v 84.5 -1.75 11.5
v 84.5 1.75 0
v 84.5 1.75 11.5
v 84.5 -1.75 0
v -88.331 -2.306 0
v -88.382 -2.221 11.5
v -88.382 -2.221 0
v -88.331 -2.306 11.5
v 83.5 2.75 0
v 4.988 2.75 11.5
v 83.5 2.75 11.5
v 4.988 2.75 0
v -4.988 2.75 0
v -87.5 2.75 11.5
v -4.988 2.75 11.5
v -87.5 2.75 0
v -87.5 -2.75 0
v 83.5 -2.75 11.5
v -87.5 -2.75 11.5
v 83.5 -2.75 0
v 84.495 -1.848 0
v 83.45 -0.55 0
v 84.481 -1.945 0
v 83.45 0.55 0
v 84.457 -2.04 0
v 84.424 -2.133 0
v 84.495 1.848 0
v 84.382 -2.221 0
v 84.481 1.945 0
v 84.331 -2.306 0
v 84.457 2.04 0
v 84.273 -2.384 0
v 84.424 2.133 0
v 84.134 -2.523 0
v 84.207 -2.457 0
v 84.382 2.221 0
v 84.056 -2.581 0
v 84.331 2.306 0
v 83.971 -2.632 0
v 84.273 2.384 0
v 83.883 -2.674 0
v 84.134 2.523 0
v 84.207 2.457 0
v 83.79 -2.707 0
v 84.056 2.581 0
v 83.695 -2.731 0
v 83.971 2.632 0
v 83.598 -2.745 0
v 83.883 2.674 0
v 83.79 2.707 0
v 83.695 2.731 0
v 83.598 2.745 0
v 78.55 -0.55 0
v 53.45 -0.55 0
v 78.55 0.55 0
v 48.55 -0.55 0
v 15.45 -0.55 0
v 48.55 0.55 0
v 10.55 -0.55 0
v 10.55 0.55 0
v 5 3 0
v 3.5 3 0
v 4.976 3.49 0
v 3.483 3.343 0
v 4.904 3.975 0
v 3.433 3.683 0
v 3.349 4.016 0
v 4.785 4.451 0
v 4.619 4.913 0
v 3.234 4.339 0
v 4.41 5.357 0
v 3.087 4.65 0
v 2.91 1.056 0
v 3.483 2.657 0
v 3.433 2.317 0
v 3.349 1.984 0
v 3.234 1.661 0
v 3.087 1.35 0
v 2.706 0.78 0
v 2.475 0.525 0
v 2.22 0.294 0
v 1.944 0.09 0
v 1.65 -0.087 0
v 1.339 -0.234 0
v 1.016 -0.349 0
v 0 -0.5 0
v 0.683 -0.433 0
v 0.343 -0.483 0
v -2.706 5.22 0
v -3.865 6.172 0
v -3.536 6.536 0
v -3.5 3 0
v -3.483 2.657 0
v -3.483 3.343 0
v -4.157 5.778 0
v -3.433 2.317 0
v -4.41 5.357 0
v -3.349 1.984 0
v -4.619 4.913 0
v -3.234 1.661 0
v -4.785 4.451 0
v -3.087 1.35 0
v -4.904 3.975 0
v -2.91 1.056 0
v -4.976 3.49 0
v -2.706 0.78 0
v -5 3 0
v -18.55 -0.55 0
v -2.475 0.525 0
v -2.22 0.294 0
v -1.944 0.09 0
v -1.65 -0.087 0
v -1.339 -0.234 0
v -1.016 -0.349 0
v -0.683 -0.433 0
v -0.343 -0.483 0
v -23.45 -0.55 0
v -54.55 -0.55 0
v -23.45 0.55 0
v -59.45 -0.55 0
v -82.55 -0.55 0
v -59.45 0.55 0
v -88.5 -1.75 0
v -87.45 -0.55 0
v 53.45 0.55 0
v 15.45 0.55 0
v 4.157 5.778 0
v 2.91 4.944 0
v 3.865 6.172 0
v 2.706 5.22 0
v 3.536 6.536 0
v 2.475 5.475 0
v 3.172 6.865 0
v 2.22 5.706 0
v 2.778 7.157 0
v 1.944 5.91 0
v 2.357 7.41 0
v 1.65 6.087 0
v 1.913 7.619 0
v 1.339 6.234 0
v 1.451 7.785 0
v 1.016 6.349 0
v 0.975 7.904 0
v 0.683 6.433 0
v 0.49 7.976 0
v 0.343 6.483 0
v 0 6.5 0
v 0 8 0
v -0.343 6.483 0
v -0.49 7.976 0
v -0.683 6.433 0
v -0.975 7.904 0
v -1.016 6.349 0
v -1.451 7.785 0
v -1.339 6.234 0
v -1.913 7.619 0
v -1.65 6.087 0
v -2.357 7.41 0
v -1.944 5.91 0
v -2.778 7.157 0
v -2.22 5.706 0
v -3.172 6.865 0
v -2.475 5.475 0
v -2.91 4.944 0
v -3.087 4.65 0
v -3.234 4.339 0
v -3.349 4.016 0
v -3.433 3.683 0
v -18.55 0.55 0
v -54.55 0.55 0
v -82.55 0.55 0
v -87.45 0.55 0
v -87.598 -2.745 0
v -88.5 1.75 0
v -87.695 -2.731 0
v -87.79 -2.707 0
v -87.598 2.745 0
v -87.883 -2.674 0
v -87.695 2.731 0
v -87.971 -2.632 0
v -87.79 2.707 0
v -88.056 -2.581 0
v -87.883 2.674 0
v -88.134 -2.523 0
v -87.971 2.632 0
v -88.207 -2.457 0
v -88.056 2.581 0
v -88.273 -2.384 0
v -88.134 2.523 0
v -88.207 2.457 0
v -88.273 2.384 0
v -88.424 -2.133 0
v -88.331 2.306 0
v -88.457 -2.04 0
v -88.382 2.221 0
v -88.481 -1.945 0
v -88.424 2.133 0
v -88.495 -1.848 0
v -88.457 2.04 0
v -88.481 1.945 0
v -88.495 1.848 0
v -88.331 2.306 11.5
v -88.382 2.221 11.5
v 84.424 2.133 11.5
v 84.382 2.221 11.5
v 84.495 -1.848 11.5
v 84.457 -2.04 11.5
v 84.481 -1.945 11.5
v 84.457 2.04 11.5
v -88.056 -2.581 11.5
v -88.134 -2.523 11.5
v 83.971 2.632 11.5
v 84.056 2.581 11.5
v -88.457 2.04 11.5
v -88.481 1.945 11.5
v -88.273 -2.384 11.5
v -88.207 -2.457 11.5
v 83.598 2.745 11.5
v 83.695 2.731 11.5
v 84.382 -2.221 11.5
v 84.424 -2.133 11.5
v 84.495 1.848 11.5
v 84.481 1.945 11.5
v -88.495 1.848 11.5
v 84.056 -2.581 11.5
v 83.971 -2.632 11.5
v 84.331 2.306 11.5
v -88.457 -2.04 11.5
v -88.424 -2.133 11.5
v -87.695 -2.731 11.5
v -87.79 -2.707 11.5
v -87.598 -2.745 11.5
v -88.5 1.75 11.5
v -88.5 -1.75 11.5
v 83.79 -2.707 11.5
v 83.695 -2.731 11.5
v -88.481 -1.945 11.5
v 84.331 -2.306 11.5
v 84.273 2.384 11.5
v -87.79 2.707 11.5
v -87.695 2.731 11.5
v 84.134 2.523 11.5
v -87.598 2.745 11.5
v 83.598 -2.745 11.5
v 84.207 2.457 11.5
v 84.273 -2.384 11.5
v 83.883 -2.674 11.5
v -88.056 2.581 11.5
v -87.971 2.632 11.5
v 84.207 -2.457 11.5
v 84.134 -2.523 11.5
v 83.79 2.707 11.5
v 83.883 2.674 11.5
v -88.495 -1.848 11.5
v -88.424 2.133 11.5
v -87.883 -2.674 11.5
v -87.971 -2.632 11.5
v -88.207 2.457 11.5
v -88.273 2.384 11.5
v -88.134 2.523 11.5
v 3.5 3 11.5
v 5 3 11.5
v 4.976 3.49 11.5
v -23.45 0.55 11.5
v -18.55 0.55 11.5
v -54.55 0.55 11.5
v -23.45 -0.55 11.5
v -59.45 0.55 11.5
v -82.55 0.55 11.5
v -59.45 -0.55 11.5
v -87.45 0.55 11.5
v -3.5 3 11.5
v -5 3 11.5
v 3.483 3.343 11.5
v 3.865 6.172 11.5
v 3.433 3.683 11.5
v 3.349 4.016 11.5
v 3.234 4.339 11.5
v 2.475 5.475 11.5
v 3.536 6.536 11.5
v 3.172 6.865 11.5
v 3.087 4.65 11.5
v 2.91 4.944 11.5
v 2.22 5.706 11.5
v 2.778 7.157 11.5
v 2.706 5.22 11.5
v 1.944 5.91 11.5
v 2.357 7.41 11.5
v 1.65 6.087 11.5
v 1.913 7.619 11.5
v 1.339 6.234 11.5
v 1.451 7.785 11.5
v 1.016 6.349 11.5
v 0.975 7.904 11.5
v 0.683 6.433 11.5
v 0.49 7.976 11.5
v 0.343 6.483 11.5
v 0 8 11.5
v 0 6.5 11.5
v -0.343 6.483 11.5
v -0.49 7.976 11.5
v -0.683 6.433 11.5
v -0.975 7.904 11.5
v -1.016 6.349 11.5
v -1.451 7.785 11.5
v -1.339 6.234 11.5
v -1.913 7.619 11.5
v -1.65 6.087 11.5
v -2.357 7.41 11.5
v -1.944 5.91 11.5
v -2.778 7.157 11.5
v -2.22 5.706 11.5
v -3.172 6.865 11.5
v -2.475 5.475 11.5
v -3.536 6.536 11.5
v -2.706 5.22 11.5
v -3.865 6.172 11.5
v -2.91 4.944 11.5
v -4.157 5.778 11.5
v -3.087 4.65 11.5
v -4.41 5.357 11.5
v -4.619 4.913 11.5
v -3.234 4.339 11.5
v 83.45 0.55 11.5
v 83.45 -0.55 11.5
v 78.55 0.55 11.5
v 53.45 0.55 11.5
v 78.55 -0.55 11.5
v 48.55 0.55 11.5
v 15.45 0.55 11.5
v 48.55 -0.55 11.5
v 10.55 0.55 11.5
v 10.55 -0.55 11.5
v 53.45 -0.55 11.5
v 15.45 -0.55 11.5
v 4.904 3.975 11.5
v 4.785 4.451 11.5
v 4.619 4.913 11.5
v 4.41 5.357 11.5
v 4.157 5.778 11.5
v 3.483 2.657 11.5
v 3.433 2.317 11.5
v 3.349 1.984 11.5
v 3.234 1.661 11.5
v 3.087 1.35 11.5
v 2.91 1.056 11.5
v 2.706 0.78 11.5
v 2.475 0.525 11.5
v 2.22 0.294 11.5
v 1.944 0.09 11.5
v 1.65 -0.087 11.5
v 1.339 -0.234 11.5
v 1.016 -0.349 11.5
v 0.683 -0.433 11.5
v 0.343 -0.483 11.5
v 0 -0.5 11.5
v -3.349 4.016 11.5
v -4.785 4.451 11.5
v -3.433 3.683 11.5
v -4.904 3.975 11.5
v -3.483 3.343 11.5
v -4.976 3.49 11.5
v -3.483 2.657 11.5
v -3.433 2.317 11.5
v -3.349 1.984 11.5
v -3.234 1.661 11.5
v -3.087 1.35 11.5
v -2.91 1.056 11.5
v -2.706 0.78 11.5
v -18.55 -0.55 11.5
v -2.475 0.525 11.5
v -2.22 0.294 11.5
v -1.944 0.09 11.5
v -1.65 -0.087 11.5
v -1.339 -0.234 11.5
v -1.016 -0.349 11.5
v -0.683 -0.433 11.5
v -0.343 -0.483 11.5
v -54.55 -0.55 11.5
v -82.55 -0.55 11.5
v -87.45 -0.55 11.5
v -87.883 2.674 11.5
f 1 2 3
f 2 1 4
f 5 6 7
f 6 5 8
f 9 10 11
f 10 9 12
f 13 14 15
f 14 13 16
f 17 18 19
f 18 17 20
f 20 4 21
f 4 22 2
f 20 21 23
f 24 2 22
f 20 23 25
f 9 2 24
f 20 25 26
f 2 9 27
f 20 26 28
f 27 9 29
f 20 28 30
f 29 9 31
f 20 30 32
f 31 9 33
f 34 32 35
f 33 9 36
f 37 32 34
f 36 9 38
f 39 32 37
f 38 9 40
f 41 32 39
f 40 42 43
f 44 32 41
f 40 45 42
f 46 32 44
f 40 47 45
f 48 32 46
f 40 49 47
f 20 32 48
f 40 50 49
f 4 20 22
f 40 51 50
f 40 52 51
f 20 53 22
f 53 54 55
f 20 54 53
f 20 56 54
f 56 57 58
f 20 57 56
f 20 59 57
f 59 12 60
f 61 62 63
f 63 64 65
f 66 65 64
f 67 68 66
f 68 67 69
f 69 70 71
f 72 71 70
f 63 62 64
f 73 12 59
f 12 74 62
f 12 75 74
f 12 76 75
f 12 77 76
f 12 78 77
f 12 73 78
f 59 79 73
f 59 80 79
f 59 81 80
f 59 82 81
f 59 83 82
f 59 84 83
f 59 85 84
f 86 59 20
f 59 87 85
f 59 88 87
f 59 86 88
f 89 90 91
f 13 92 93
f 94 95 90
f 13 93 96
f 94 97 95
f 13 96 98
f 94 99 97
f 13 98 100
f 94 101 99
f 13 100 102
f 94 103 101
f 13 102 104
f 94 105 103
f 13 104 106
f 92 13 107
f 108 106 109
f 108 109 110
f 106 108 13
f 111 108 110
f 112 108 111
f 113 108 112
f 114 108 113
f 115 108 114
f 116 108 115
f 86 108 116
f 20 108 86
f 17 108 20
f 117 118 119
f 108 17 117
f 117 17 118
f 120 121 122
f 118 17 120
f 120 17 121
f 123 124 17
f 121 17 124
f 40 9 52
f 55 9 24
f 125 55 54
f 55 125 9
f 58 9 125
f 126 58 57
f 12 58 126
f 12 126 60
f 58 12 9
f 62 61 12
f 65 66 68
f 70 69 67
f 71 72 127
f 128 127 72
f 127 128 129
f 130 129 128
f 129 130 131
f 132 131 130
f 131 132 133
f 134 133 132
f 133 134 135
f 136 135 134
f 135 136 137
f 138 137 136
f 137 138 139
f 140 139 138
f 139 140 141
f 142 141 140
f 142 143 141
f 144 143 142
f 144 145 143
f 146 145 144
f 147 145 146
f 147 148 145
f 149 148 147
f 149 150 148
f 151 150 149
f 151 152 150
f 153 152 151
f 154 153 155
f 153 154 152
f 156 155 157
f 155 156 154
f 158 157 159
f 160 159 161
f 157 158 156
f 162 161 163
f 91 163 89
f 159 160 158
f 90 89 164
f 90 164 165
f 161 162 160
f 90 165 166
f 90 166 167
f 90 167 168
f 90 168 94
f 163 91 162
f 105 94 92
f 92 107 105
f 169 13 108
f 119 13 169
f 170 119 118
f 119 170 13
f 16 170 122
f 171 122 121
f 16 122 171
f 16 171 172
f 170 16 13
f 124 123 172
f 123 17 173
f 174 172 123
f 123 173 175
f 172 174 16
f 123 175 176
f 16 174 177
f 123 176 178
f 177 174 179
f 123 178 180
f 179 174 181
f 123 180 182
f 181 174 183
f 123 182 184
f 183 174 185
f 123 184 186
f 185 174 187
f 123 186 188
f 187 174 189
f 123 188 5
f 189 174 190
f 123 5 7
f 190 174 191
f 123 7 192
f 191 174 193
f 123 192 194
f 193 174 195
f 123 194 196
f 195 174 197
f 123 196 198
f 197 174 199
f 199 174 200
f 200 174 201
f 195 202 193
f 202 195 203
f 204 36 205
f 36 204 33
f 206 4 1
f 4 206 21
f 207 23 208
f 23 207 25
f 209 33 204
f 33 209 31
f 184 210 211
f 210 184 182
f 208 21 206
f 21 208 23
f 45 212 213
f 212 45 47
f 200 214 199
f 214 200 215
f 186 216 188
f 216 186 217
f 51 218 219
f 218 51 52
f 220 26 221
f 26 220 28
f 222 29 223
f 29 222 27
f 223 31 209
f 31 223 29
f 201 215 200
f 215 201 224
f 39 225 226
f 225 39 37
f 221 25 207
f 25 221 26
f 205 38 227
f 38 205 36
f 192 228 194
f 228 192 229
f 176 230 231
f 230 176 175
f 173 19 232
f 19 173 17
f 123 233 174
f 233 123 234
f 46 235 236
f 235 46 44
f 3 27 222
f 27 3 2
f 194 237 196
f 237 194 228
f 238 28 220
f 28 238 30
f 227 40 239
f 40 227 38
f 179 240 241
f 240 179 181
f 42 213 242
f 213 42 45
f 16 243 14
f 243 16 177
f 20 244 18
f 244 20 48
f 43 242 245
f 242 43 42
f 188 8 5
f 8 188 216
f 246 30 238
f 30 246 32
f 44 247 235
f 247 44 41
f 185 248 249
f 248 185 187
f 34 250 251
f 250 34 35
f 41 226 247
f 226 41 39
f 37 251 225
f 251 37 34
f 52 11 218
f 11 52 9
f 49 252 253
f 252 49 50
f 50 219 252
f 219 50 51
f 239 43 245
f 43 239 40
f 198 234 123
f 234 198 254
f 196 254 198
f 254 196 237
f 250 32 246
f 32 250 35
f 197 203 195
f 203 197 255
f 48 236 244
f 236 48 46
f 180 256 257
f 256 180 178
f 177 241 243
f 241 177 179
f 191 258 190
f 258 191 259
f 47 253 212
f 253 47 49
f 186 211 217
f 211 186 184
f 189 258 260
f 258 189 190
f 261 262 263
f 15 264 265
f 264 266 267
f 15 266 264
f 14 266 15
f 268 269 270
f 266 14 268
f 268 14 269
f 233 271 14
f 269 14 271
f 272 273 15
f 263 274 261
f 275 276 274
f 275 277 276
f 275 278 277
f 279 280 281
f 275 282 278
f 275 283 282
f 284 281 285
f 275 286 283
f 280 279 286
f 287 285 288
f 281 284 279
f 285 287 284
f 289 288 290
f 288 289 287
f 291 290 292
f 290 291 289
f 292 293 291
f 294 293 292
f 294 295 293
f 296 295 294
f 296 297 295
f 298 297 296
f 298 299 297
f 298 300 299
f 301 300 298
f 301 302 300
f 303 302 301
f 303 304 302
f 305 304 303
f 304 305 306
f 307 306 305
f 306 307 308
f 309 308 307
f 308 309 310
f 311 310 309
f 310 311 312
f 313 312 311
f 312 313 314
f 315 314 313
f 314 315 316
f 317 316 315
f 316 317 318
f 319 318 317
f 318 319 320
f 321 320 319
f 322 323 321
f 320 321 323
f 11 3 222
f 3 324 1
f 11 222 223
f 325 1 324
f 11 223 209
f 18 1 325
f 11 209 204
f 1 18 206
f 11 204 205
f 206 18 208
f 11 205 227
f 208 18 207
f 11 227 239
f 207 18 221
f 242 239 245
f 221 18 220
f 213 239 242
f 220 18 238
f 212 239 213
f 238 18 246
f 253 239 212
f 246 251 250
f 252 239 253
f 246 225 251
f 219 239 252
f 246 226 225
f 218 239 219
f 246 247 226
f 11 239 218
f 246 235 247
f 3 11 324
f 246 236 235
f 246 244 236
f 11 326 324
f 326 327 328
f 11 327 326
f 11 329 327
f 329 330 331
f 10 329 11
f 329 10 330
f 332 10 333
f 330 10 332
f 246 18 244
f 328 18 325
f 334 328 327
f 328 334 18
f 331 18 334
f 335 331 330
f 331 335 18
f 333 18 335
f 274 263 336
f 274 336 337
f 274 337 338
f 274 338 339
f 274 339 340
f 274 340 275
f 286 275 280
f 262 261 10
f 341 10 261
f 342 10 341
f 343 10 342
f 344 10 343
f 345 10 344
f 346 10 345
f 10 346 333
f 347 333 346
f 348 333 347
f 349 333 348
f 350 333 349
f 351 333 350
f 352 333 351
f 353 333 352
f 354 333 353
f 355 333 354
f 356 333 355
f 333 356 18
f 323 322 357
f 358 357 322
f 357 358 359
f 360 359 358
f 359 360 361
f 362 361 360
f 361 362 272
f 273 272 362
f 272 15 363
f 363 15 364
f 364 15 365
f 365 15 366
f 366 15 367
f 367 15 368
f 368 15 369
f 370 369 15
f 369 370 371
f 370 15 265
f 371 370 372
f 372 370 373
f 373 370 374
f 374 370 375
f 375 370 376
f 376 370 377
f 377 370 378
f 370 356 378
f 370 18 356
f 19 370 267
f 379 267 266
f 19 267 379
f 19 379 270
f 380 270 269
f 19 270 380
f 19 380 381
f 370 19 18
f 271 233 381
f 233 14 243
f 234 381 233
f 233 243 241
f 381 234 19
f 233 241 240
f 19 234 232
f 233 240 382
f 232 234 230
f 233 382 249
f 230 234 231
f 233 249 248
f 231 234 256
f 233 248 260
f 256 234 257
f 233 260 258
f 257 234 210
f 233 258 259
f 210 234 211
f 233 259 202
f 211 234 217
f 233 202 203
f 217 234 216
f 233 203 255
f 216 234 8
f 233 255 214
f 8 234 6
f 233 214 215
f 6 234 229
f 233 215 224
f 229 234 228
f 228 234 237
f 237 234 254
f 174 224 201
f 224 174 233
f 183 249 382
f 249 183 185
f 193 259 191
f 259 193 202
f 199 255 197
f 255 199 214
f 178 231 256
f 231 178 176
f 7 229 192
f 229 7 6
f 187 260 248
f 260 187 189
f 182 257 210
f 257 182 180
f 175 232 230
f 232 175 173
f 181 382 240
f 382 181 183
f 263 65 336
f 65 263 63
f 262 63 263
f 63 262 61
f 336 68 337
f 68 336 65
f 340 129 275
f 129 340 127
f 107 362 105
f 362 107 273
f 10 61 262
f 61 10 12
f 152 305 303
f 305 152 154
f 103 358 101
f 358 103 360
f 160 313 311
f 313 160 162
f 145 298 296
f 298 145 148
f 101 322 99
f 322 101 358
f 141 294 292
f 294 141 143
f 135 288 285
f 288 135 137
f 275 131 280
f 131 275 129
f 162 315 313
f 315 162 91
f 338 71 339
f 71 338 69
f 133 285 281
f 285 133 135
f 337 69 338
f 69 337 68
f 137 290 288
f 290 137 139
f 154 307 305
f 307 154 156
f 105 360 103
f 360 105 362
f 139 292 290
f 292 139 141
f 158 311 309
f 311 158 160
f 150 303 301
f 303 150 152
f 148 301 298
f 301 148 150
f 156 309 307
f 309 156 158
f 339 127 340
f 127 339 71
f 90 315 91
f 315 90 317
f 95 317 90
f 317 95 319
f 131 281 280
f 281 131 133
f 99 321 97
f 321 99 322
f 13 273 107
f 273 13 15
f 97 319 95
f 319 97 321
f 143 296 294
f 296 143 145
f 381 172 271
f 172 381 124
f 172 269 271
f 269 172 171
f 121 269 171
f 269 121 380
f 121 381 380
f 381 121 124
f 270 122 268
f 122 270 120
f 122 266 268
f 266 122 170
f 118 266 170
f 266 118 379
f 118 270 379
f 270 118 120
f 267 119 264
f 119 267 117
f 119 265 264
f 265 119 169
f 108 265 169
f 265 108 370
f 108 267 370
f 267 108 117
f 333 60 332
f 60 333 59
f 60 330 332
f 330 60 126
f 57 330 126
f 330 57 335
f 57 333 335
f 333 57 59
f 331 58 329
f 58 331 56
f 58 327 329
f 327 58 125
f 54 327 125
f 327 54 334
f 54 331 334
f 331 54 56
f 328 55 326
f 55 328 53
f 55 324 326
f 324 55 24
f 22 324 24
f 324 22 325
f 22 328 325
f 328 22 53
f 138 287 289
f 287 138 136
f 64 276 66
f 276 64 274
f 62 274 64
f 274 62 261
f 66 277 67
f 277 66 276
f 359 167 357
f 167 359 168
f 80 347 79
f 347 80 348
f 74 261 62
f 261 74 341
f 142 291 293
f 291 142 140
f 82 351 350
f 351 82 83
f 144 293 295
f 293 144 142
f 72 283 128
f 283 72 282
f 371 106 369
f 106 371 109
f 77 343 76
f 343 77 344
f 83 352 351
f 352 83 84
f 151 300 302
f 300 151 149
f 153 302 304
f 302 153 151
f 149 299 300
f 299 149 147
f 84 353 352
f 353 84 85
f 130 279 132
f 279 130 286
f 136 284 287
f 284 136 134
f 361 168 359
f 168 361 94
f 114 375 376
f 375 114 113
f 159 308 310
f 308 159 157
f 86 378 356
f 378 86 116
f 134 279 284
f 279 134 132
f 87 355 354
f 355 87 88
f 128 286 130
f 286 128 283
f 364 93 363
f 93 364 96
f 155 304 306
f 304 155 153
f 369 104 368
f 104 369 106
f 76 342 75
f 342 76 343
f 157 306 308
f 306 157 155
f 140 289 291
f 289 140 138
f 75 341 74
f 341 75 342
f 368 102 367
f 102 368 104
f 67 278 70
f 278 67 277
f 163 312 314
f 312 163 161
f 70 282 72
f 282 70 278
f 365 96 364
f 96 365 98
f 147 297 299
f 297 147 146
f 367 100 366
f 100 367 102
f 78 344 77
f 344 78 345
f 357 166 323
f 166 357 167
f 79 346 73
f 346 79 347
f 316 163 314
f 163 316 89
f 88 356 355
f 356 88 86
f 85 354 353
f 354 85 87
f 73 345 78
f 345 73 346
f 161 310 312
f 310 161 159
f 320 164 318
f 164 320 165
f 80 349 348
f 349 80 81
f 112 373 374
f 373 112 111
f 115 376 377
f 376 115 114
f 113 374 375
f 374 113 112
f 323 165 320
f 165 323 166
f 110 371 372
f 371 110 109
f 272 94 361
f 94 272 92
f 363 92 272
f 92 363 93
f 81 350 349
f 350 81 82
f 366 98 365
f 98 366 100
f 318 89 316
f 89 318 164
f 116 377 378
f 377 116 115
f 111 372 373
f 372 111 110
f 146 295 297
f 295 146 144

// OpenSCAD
// Busy board enclosure - v2 LED carrier bar for D23-D28 (H4); print two, the second turned over is D9-D14 (H5)
// Render this file to generate busy_board_led_bar_side.stl. Print in PETG, flat
// on the bed as modelled, no supports.

include <_busy_board_enclosure.scad>

board_v3 = false;     // v2.0 board, 222 mm square
busy_board_led_bar_side();
